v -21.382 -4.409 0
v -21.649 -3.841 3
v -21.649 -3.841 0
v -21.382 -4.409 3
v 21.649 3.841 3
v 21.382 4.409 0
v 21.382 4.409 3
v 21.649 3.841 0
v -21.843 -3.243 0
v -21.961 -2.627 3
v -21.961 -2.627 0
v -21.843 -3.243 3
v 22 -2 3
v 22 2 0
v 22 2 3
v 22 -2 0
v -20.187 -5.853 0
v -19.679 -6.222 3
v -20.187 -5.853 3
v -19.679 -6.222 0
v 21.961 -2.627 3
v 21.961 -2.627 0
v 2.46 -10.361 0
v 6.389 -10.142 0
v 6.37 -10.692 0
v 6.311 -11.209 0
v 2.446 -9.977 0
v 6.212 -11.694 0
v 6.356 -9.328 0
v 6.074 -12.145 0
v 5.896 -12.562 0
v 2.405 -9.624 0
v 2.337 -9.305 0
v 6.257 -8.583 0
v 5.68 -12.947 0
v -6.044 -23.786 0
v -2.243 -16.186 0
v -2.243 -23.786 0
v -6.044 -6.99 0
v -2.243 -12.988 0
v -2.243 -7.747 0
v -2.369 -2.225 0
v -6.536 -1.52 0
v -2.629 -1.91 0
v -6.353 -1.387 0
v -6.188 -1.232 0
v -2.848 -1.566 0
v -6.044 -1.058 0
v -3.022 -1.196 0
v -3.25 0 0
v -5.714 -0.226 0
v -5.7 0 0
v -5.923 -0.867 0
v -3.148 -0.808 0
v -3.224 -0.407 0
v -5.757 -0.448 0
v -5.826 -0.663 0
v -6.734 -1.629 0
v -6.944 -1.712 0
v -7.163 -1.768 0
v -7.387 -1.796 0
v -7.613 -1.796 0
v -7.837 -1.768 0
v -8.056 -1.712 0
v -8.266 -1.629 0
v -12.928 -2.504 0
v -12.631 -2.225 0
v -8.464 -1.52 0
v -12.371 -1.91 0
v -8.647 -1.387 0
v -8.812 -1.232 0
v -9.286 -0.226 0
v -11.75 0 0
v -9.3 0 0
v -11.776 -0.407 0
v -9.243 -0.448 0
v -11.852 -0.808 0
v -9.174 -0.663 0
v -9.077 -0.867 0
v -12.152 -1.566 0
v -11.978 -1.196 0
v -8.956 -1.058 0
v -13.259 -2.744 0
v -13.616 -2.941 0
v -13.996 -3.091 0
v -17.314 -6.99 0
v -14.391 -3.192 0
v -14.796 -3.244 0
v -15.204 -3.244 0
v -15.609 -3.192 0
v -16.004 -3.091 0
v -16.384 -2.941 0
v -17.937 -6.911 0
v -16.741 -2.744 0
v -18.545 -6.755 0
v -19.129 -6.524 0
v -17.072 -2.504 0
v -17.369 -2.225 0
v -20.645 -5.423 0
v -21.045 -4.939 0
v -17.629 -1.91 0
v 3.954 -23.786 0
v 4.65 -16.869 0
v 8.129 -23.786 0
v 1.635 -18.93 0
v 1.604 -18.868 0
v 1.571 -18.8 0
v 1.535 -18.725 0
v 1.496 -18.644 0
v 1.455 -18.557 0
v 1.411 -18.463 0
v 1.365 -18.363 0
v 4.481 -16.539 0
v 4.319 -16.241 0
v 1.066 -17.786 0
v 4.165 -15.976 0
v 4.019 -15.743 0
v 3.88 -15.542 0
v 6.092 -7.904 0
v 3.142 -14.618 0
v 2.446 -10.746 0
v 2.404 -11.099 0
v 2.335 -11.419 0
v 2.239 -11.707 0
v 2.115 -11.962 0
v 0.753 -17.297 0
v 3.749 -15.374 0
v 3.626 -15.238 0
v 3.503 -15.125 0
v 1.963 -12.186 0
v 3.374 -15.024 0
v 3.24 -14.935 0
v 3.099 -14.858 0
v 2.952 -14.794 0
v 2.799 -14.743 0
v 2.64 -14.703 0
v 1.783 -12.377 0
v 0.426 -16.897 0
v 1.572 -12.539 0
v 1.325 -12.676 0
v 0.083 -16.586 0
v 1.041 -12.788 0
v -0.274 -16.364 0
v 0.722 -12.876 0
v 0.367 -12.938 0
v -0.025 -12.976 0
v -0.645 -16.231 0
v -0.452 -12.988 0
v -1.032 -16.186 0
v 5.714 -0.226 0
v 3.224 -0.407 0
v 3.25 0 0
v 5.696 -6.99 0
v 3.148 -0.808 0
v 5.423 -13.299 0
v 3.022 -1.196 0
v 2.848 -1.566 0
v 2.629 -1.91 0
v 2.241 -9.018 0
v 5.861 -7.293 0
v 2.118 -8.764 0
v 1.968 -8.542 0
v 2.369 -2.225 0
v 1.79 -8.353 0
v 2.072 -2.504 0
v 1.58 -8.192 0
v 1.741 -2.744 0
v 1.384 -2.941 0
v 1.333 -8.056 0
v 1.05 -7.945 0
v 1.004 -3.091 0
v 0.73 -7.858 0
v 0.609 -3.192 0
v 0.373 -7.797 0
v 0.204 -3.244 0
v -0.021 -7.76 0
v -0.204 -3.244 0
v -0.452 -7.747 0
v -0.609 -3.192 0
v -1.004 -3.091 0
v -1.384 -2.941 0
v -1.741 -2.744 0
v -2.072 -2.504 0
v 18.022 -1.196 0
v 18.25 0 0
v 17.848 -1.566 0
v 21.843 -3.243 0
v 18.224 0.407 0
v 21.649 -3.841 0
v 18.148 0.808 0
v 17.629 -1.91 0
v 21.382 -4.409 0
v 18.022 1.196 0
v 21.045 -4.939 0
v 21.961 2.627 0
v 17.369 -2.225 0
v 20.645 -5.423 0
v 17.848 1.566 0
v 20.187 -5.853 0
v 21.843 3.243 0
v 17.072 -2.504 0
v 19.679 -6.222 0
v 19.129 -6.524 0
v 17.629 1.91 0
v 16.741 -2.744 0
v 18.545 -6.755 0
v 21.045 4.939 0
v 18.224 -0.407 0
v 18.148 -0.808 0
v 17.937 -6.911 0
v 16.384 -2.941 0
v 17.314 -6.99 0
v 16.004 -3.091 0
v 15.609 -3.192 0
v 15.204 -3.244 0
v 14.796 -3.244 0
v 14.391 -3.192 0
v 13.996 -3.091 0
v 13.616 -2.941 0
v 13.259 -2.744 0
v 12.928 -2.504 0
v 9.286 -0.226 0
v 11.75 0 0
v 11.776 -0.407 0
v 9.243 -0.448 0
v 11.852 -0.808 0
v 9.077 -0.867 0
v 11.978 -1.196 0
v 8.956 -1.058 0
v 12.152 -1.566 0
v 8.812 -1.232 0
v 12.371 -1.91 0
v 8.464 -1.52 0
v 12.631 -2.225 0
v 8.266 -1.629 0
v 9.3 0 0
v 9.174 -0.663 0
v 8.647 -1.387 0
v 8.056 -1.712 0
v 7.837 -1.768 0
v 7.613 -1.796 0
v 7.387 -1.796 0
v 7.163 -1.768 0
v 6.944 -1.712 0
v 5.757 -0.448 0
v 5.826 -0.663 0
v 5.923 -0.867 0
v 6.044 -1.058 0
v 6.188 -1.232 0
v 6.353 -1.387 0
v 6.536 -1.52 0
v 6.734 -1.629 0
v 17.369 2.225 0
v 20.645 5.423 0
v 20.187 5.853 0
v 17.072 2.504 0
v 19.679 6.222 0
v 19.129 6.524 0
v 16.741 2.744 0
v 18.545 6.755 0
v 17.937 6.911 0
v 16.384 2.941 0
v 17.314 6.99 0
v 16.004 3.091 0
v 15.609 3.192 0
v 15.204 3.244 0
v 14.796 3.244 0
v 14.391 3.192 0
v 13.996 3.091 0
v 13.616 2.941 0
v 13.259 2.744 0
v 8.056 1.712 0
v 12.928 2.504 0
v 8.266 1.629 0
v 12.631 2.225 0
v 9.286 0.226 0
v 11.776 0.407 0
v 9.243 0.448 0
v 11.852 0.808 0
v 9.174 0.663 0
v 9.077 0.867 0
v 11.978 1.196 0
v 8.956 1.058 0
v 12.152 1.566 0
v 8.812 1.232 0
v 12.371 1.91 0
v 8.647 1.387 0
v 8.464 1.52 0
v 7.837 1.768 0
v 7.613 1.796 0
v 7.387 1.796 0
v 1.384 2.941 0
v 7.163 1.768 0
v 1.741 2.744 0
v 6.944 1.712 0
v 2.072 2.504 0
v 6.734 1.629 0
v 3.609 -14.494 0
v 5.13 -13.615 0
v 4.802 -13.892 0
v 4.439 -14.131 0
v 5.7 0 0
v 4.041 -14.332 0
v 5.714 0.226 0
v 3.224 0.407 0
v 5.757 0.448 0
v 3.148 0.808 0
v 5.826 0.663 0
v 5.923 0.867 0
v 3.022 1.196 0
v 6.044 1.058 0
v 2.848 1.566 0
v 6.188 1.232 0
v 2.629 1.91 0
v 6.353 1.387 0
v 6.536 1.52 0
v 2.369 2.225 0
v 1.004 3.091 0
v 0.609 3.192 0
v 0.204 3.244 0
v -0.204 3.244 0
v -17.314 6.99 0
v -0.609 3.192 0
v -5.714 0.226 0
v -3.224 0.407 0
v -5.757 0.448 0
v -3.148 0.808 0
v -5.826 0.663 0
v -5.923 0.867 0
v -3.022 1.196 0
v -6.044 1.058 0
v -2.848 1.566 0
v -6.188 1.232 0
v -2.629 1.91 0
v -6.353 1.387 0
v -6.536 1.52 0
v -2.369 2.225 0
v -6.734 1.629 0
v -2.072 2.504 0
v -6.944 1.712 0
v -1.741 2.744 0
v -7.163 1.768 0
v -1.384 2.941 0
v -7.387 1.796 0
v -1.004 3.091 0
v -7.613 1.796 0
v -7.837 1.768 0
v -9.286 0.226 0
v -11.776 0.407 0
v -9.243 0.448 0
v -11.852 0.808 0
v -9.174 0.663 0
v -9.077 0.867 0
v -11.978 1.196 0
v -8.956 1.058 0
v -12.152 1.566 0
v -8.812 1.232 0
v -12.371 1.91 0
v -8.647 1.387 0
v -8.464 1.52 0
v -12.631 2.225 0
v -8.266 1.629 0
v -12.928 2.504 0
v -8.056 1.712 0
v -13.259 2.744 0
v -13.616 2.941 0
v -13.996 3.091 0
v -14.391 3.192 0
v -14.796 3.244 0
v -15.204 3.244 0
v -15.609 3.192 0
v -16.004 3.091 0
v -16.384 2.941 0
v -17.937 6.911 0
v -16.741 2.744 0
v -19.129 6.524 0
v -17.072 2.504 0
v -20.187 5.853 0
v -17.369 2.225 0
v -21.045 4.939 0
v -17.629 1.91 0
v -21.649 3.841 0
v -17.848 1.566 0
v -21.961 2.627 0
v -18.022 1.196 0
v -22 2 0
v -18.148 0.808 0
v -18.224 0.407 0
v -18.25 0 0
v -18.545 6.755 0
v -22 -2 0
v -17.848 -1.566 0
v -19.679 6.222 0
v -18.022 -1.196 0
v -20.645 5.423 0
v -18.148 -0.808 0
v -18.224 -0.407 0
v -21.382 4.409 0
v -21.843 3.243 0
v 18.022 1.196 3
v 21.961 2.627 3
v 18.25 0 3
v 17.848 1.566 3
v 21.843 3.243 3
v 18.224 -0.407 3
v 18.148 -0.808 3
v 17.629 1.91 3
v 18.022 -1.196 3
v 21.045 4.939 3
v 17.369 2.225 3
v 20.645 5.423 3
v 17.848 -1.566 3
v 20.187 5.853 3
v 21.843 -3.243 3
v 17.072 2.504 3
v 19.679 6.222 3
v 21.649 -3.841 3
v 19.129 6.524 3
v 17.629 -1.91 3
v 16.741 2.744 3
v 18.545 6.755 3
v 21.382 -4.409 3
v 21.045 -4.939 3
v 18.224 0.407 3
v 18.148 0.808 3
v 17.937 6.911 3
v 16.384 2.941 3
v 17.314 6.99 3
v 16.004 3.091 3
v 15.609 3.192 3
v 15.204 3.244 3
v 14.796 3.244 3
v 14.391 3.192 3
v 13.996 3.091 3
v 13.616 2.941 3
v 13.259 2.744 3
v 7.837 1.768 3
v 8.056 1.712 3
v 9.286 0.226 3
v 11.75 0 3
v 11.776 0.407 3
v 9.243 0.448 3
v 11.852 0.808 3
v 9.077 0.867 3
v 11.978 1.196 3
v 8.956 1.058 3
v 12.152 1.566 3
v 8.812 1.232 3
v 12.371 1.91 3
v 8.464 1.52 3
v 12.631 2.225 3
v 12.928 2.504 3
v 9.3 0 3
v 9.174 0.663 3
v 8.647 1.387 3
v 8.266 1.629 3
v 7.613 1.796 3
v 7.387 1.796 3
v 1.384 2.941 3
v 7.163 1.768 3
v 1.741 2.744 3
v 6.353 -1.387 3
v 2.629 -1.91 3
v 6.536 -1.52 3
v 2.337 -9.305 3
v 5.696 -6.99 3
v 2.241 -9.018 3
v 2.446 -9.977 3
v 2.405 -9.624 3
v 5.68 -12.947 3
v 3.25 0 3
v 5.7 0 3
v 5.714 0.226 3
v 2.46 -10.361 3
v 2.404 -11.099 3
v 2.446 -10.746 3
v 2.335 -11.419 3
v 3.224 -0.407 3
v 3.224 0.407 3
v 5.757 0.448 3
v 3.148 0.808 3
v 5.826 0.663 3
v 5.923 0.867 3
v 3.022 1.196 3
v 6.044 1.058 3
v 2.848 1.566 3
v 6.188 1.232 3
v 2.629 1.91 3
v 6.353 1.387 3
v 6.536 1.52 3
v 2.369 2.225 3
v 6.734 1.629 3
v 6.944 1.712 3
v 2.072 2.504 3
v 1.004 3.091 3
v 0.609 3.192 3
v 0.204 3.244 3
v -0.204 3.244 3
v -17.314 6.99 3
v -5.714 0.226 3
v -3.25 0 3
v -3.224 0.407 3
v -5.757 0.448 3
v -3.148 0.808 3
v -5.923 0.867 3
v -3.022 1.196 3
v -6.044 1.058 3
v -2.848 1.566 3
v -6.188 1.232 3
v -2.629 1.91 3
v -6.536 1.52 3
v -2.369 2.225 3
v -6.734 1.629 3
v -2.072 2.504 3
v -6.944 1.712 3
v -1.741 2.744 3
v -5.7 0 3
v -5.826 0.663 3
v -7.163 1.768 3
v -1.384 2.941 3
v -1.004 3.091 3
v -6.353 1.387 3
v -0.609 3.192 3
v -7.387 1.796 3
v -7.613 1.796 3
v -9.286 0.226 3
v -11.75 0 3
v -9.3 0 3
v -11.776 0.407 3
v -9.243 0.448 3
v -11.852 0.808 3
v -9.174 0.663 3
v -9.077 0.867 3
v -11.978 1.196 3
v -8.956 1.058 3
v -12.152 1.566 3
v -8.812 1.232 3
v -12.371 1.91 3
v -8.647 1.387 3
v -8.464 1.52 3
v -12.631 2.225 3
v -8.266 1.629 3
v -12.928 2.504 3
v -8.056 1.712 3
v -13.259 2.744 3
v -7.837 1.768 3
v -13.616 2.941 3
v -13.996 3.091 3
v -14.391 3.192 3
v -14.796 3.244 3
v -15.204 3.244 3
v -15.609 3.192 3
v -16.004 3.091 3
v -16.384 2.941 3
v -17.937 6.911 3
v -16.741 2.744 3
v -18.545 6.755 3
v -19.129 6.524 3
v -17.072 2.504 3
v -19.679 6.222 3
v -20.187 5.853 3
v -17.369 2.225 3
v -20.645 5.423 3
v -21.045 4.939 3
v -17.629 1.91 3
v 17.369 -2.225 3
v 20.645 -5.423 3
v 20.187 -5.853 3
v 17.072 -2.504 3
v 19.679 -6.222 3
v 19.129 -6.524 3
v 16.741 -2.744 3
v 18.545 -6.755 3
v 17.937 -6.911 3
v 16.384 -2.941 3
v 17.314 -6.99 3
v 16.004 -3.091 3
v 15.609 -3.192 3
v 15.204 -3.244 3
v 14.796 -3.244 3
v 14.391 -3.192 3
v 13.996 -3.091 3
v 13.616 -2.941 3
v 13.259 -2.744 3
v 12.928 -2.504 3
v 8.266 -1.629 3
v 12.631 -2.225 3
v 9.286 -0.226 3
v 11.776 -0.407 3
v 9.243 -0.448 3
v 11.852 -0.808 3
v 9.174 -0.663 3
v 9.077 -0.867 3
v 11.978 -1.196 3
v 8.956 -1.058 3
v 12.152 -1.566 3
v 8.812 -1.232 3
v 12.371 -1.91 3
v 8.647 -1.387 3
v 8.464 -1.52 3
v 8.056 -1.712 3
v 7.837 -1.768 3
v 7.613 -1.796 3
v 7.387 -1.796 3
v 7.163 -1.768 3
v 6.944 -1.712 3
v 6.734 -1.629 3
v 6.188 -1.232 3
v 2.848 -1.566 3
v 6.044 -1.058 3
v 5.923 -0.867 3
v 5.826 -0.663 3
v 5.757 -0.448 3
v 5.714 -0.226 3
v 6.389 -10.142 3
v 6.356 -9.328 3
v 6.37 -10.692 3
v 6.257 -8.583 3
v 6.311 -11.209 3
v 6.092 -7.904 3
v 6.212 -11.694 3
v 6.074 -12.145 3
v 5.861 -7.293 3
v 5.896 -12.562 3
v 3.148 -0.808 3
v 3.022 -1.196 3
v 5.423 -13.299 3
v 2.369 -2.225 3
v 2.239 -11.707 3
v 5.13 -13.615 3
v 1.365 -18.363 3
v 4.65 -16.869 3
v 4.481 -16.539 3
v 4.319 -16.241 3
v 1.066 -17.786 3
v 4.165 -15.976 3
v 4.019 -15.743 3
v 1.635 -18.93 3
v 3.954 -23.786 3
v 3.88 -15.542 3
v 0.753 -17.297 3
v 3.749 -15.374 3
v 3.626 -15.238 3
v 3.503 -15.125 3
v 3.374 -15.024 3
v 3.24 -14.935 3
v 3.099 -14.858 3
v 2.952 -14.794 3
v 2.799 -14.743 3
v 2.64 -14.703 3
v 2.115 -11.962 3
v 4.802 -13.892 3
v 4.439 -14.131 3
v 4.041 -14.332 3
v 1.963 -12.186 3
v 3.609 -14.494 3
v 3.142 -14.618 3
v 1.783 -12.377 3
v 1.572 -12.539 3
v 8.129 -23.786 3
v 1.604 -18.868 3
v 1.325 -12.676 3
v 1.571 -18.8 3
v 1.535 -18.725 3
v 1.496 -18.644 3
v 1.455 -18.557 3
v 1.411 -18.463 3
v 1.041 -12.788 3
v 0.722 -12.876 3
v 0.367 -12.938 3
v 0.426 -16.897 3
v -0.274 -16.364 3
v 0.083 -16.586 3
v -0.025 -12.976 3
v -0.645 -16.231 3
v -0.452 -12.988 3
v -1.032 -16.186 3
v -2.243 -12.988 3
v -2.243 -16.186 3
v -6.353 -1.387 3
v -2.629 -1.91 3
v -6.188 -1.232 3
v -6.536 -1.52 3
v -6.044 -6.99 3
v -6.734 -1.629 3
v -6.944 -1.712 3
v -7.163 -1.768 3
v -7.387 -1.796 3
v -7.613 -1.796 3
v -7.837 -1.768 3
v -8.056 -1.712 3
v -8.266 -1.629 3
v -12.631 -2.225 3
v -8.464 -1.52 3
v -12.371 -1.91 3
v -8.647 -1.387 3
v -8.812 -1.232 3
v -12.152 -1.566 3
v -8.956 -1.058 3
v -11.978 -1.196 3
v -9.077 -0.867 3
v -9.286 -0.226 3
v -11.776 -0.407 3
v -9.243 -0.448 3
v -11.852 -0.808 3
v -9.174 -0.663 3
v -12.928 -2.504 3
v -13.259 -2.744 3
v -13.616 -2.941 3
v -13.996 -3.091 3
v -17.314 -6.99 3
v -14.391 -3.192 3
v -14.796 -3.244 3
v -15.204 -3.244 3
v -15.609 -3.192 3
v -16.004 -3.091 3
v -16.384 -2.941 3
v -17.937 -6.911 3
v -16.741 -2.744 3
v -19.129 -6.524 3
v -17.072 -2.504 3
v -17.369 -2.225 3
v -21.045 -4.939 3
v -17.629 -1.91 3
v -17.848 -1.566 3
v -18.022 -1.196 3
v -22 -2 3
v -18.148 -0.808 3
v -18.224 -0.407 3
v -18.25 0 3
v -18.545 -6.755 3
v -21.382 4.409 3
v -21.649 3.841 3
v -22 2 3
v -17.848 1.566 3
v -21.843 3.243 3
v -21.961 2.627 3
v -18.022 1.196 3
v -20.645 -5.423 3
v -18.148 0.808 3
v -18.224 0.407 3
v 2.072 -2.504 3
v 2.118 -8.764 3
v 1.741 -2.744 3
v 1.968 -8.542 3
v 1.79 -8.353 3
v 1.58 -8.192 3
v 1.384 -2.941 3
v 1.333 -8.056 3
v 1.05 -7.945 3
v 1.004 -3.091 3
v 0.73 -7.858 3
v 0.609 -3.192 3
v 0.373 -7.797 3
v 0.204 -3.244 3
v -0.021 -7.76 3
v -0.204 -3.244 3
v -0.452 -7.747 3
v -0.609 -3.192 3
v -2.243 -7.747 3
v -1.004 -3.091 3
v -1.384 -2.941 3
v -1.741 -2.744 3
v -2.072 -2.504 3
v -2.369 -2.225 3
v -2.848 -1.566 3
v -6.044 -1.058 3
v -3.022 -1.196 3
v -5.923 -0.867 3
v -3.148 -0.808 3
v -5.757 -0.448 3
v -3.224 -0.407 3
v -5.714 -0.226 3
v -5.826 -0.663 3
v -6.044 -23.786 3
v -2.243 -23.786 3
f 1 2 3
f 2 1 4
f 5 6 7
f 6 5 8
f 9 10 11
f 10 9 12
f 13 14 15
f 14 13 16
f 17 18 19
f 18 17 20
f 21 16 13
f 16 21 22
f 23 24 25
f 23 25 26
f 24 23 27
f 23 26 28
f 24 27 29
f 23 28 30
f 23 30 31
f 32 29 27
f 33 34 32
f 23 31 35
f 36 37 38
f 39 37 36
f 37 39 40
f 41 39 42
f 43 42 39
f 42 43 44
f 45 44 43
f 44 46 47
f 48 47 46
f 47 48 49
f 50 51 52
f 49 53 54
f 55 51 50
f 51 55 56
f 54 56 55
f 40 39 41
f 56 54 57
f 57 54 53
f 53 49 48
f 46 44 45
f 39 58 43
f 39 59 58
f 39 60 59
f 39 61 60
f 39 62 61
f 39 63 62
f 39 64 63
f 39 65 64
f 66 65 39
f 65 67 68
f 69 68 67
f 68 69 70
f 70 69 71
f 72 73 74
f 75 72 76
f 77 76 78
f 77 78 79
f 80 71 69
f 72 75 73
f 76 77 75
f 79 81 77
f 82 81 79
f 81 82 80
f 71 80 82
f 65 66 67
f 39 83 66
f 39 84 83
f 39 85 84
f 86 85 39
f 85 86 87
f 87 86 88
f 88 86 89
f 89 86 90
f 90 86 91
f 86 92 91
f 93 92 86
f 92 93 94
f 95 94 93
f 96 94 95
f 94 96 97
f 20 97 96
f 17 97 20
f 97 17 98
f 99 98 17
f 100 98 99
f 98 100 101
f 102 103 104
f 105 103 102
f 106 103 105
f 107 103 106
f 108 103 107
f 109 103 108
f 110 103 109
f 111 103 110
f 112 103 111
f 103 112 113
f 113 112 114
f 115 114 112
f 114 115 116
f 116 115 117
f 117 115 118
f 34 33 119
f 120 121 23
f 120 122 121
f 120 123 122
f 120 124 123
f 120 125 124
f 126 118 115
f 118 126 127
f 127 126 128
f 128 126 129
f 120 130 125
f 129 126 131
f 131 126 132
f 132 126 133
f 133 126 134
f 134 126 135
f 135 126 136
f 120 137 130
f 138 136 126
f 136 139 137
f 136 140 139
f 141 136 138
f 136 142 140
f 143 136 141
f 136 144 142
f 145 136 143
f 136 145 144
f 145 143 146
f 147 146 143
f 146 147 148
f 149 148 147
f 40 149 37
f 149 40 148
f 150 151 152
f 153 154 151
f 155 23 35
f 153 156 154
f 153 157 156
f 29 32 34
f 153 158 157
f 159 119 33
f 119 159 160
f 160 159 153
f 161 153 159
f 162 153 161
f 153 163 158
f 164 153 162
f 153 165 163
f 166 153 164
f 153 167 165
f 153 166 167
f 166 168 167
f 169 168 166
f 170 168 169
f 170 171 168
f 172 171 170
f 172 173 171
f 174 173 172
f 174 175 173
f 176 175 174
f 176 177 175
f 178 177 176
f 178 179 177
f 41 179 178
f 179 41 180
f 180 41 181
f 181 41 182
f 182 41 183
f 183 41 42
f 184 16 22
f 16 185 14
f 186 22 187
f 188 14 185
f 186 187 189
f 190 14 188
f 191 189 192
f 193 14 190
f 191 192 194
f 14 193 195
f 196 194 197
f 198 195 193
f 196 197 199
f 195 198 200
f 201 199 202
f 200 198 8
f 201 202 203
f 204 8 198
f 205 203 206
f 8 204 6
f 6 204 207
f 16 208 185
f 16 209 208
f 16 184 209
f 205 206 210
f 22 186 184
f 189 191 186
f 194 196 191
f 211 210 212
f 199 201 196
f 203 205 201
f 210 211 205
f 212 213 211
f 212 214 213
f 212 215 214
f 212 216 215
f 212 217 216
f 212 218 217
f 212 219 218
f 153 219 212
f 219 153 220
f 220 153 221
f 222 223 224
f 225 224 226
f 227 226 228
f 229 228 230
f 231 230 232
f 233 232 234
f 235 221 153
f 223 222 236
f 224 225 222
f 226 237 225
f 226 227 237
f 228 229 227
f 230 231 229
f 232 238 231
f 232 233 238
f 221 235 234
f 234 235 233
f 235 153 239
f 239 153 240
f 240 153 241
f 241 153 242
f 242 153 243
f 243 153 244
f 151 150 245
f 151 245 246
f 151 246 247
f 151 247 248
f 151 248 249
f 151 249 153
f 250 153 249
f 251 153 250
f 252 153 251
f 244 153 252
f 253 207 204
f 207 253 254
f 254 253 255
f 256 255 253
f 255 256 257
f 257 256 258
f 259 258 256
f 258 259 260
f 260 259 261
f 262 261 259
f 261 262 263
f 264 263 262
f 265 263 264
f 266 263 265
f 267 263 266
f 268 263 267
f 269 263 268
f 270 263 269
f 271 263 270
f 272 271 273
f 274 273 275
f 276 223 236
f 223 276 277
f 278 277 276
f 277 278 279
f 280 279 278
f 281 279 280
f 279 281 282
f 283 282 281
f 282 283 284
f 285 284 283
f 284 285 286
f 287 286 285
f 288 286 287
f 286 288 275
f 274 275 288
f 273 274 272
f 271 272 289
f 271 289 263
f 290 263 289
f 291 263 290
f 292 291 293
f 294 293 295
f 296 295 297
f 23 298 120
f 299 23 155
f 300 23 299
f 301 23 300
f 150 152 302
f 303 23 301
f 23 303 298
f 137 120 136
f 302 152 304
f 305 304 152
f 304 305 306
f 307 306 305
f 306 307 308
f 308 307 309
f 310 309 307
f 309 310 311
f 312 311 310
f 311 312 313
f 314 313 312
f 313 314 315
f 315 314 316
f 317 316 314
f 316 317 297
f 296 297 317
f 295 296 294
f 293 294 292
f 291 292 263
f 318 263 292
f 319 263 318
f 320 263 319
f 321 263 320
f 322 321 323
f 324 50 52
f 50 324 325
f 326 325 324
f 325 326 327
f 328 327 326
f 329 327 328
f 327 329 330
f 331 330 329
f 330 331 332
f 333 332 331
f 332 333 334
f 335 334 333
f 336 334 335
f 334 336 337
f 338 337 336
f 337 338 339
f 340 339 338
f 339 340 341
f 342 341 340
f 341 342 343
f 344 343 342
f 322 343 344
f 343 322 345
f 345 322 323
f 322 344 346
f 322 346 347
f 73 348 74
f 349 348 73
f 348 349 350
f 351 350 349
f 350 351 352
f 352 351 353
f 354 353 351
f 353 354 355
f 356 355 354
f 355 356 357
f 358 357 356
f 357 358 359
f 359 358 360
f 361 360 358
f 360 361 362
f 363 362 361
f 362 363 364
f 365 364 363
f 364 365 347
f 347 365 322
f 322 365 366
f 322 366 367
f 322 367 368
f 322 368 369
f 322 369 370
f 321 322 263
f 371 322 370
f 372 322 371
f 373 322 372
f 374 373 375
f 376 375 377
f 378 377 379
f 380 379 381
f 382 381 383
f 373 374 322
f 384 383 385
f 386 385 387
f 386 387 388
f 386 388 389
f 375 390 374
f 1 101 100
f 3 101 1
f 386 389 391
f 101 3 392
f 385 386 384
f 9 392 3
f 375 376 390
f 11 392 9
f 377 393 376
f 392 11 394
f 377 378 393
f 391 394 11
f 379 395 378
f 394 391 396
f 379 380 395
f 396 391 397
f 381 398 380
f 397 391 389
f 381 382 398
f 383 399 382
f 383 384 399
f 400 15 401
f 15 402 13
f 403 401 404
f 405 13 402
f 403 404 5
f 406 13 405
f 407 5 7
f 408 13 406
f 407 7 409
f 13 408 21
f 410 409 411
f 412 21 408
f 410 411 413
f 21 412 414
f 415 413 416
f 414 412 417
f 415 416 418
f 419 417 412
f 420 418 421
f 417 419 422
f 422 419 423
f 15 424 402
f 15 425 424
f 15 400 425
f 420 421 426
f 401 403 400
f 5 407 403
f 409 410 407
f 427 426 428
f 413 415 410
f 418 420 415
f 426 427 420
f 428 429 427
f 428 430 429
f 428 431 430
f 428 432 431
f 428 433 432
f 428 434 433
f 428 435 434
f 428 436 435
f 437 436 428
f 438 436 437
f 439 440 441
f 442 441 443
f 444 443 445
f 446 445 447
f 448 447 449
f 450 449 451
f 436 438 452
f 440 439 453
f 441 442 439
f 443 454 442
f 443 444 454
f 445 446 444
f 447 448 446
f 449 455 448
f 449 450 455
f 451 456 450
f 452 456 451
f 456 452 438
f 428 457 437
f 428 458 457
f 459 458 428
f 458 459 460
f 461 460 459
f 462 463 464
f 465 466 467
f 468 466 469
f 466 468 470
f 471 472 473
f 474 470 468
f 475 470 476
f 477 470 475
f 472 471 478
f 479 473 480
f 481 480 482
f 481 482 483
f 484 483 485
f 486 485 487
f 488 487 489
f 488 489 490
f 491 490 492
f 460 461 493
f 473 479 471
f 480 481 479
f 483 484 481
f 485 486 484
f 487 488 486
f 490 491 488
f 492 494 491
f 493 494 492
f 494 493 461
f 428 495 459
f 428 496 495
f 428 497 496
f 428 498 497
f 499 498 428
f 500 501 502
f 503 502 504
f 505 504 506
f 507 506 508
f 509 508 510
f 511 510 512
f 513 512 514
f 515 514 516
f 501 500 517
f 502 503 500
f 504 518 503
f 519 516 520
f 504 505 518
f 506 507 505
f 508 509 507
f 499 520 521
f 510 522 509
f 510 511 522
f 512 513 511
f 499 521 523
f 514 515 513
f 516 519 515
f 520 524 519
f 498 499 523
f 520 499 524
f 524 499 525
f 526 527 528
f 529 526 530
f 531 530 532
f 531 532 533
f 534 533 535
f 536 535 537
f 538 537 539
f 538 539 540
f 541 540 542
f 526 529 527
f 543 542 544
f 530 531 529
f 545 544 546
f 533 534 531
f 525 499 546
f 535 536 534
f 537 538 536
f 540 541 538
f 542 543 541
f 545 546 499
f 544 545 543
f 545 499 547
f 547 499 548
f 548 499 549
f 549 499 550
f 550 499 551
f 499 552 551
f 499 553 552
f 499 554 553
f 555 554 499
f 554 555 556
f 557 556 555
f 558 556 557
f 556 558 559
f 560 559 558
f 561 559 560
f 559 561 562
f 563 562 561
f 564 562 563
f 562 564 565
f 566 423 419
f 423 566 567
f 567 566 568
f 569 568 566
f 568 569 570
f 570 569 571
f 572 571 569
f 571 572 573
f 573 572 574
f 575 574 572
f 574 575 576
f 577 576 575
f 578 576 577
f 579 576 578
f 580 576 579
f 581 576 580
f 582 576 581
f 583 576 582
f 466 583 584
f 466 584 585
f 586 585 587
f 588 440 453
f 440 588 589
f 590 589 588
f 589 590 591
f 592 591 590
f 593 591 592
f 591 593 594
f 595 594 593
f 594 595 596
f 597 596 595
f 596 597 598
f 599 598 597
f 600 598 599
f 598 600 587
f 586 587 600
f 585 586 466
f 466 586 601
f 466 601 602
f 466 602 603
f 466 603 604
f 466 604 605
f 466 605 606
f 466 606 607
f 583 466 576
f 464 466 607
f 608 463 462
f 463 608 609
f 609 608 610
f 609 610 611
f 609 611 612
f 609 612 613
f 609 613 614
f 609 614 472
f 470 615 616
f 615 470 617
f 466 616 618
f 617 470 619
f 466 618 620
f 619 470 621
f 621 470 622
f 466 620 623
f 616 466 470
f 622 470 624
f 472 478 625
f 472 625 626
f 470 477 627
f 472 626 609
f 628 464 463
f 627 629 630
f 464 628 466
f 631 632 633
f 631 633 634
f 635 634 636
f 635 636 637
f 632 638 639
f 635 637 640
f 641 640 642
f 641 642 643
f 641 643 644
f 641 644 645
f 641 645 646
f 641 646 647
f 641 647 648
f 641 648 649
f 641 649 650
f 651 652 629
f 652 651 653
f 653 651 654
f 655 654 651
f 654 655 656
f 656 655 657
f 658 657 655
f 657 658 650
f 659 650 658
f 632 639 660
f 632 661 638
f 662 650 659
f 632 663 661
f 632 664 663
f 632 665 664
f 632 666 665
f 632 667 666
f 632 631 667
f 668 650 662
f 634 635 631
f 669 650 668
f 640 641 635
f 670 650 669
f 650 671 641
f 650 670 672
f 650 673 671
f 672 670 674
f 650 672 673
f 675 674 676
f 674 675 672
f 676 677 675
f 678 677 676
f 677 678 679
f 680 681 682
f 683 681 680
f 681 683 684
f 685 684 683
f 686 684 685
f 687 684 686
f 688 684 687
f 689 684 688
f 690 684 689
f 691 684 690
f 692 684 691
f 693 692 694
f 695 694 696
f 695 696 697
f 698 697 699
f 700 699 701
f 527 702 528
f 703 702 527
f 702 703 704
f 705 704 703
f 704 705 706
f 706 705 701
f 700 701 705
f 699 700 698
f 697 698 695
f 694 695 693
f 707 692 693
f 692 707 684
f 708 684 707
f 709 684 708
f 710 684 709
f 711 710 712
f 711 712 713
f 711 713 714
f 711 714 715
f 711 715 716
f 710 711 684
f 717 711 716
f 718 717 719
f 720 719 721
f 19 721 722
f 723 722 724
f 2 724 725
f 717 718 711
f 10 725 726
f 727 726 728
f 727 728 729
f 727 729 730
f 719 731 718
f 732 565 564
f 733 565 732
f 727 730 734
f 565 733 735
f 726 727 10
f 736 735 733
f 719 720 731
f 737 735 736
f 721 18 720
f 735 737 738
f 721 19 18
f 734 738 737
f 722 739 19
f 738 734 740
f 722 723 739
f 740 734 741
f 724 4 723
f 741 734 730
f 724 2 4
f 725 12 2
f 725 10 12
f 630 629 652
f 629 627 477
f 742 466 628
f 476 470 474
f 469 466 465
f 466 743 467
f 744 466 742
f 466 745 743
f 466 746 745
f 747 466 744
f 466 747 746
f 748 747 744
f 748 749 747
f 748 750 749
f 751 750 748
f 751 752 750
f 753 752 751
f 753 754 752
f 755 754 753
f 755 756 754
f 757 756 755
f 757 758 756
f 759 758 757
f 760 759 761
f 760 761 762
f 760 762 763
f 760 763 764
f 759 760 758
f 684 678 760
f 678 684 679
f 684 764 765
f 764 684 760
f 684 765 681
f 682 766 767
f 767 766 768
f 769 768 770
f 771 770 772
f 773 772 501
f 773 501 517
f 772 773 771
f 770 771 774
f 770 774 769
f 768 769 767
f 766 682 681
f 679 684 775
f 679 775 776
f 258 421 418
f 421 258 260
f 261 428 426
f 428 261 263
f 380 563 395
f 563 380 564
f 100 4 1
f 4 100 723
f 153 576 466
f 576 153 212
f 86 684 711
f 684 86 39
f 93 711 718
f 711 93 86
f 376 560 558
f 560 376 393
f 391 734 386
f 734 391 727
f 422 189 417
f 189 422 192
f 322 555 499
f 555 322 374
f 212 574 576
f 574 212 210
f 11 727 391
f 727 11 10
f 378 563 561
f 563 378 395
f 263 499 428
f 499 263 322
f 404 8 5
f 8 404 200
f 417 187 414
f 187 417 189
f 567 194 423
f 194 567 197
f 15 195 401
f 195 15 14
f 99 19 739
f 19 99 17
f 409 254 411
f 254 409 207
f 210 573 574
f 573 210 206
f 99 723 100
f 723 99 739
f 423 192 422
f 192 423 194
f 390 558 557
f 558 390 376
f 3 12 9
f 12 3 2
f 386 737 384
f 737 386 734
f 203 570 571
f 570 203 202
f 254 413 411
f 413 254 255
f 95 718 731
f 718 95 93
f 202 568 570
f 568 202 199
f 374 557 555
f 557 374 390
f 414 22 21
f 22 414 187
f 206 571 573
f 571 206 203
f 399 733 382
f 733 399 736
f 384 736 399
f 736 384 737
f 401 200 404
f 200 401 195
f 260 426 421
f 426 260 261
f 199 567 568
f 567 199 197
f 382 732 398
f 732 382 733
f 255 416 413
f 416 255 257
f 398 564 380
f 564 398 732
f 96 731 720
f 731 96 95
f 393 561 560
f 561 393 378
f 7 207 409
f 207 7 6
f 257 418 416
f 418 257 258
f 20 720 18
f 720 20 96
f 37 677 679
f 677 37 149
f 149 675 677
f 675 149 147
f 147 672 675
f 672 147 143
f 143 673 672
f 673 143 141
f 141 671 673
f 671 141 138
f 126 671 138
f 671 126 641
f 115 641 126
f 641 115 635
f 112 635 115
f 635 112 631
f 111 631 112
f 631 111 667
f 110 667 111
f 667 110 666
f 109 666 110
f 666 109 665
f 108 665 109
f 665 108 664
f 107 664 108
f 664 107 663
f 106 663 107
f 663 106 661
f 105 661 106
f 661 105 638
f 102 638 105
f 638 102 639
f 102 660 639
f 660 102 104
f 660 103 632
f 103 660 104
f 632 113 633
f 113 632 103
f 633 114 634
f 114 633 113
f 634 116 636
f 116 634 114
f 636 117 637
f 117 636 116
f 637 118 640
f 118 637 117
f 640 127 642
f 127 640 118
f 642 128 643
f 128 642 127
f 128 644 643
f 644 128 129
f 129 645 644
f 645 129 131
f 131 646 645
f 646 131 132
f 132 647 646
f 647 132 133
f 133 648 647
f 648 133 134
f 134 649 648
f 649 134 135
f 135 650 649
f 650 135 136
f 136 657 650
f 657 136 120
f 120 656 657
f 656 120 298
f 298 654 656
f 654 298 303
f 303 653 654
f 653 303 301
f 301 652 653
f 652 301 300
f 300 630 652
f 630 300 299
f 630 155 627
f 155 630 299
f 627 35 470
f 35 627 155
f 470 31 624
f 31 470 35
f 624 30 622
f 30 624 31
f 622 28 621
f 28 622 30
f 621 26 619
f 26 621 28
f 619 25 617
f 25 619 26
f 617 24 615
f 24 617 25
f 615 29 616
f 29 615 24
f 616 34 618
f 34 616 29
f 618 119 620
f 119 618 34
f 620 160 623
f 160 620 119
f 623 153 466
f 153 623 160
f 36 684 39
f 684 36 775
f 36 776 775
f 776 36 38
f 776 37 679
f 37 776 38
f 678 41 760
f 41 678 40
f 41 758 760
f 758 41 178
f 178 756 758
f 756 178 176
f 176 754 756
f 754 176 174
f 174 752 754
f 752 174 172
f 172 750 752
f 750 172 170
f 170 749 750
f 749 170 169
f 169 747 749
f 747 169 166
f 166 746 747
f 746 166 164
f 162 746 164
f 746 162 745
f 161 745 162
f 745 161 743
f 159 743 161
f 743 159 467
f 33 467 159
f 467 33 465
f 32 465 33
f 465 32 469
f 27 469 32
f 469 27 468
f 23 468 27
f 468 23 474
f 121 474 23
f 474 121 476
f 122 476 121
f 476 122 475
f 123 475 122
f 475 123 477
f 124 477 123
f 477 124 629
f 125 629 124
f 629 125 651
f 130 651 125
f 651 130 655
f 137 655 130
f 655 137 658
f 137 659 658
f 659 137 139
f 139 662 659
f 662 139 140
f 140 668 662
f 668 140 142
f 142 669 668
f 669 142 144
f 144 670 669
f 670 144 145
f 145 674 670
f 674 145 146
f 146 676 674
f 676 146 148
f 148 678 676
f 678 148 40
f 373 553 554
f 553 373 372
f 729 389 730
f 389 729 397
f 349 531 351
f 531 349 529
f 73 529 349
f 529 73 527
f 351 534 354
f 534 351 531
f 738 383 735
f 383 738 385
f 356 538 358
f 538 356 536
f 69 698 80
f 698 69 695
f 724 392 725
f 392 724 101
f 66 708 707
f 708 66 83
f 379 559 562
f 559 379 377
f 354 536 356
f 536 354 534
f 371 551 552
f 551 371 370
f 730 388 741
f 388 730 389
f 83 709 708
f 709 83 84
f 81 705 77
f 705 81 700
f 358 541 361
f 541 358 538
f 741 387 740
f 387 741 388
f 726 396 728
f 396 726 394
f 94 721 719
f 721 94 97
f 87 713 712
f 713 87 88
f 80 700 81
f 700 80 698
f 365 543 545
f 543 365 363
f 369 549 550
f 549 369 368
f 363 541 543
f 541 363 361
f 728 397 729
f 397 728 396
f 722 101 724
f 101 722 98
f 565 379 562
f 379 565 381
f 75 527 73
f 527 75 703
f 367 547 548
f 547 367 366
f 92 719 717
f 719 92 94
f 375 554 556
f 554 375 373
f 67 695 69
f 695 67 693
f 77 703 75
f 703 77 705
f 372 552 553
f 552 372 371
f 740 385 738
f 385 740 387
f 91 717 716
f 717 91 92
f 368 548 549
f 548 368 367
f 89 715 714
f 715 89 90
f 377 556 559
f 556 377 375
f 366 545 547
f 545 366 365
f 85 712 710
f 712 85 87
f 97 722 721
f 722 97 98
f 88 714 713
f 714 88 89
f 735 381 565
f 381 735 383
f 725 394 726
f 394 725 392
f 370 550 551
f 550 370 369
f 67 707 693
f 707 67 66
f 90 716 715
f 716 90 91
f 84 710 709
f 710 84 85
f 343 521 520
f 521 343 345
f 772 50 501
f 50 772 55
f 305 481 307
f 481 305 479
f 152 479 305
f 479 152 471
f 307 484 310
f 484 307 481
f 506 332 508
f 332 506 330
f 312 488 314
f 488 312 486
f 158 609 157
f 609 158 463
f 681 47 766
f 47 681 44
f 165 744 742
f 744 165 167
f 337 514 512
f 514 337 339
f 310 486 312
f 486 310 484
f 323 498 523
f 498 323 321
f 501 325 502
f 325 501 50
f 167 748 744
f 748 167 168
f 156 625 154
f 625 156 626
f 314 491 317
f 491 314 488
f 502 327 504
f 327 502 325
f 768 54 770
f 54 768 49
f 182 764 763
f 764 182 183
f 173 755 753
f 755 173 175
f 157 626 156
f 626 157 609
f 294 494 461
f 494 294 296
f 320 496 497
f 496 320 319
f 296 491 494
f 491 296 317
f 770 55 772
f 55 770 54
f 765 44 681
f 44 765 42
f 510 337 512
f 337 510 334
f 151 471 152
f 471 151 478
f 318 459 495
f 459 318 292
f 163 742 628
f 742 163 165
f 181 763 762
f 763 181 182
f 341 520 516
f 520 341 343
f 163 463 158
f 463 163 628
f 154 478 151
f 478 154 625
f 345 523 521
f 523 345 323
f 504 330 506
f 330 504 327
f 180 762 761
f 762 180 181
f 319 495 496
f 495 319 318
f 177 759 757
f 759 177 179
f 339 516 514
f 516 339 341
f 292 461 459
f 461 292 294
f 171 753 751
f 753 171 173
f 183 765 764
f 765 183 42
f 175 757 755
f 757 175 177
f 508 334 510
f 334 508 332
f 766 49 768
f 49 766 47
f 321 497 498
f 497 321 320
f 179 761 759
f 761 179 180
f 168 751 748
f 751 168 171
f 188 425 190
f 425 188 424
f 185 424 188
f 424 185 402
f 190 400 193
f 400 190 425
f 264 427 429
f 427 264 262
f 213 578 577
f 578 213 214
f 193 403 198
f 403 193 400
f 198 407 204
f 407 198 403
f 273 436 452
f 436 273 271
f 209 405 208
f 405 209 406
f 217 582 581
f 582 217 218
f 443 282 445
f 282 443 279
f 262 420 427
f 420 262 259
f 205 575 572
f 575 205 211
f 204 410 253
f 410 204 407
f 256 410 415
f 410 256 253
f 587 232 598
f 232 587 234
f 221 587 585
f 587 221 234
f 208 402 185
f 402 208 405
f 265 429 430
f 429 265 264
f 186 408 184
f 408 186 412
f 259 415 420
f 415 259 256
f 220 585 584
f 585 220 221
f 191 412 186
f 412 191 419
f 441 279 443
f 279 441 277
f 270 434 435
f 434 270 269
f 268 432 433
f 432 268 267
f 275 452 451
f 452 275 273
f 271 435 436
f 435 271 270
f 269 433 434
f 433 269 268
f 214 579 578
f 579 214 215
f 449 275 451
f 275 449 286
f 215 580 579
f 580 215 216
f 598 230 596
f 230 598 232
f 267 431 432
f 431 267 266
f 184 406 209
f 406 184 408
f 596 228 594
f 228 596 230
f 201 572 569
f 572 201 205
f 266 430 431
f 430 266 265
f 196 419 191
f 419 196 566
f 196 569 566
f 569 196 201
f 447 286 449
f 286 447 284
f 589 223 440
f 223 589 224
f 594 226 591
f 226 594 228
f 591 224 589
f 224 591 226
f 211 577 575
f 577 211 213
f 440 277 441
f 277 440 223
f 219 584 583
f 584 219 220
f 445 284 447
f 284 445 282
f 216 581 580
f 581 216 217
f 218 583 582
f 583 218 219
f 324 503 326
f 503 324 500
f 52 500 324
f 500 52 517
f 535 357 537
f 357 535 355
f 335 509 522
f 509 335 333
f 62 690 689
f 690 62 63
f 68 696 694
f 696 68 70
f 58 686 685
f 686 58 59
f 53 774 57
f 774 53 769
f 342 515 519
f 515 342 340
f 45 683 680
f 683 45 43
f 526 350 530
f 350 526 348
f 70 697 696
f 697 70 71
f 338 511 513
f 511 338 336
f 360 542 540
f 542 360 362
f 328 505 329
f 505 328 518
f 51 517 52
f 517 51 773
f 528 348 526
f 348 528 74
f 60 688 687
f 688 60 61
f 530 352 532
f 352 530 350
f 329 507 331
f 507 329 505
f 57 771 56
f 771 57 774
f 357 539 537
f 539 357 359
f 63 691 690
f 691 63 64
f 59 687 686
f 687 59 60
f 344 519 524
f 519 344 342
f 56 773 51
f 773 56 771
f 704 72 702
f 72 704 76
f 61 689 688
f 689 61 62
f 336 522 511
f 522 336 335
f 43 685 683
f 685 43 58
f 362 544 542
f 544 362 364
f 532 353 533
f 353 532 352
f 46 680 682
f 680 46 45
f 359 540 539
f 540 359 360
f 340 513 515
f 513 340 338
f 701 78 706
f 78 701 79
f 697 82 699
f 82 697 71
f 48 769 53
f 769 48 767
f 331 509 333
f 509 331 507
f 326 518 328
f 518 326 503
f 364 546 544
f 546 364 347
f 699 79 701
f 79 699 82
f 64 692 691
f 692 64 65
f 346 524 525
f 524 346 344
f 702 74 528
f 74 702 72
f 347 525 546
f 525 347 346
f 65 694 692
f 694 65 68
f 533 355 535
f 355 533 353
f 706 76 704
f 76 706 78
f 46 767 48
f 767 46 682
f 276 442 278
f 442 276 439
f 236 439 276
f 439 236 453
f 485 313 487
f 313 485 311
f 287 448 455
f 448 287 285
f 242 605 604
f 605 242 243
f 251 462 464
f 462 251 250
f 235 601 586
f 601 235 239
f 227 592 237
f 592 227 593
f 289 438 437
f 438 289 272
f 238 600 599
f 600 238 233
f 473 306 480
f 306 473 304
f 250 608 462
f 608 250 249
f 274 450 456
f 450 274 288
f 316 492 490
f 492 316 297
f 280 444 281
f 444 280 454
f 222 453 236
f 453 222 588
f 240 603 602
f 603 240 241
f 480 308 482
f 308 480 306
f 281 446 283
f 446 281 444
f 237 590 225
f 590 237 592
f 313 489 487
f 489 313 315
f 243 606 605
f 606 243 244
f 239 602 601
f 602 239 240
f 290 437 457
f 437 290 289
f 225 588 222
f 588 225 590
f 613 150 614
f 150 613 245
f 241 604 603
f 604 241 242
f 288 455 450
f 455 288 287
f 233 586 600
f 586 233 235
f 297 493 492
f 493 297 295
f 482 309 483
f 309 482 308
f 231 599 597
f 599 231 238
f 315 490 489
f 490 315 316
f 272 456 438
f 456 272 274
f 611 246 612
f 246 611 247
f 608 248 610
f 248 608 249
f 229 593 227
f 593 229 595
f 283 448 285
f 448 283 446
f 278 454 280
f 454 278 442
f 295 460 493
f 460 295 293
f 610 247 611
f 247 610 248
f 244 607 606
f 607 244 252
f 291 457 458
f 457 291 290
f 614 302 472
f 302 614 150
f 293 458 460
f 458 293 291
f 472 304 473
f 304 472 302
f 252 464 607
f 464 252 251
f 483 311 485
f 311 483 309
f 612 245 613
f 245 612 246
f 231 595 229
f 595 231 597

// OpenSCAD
$fn = 50;


difference() {
	union() {
		hull() {
			translate(v = [-17.0000000000, 2.0000000000, 0]) {
				cylinder(h = 3, r = 5);
			}
			translate(v = [17.0000000000, 2.0000000000, 0]) {
				cylinder(h = 3, r = 5);
			}
			translate(v = [-17.0000000000, -2.0000000000, 0]) {
				cylinder(h = 3, r = 5);
			}
			translate(v = [17.0000000000, -2.0000000000, 0]) {
				cylinder(h = 3, r = 5);
			}
		}
		translate(v = [0, -5, 0]) {
			linear_extrude(height = 3) {
				text(font = "DejaVu Sans Mono:style=Bold", halign = "center", size = 19.0000000000, text = "R", valign = "top");
			}
		}
	}
	union() {
		translate(v = [-15.0000000000, 0.0000000000, 0]) {
			translate(v = [0, 0, -100]) {
				cylinder(h = 200, r = 3.2500000000);
			}
		}
		translate(v = [0, 0, -100]) {
			cylinder(h = 200, r = 3.2500000000);
		}
		translate(v = [15.0000000000, 0.0000000000, 0]) {
			translate(v = [0, 0, -100]) {
				cylinder(h = 200, r = 3.2500000000);
			}
		}
		translate(v = [-15.0000000000, 0.0000000000, 0]) {
			translate(v = [0, 0, -100]) {
				cylinder(h = 200, r = 1.8000000000);
			}
		}
		translate(v = [-7.5000000000, 0.0000000000, 0]) {
			translate(v = [0, 0, -100]) {
				cylinder(h = 200, r = 1.8000000000);
			}
		}
		translate(v = [0, 0, -100]) {
			cylinder(h = 200, r = 1.8000000000);
		}
		translate(v = [7.5000000000, 0.0000000000, 0]) {
			translate(v = [0, 0, -100]) {
				cylinder(h = 200, r = 1.8000000000);
			}
		}
		translate(v = [15.0000000000, 0.0000000000, 0]) {
			translate(v = [0, 0, -100]) {
				cylinder(h = 200, r = 1.8000000000);
			}
		}
	}
}
